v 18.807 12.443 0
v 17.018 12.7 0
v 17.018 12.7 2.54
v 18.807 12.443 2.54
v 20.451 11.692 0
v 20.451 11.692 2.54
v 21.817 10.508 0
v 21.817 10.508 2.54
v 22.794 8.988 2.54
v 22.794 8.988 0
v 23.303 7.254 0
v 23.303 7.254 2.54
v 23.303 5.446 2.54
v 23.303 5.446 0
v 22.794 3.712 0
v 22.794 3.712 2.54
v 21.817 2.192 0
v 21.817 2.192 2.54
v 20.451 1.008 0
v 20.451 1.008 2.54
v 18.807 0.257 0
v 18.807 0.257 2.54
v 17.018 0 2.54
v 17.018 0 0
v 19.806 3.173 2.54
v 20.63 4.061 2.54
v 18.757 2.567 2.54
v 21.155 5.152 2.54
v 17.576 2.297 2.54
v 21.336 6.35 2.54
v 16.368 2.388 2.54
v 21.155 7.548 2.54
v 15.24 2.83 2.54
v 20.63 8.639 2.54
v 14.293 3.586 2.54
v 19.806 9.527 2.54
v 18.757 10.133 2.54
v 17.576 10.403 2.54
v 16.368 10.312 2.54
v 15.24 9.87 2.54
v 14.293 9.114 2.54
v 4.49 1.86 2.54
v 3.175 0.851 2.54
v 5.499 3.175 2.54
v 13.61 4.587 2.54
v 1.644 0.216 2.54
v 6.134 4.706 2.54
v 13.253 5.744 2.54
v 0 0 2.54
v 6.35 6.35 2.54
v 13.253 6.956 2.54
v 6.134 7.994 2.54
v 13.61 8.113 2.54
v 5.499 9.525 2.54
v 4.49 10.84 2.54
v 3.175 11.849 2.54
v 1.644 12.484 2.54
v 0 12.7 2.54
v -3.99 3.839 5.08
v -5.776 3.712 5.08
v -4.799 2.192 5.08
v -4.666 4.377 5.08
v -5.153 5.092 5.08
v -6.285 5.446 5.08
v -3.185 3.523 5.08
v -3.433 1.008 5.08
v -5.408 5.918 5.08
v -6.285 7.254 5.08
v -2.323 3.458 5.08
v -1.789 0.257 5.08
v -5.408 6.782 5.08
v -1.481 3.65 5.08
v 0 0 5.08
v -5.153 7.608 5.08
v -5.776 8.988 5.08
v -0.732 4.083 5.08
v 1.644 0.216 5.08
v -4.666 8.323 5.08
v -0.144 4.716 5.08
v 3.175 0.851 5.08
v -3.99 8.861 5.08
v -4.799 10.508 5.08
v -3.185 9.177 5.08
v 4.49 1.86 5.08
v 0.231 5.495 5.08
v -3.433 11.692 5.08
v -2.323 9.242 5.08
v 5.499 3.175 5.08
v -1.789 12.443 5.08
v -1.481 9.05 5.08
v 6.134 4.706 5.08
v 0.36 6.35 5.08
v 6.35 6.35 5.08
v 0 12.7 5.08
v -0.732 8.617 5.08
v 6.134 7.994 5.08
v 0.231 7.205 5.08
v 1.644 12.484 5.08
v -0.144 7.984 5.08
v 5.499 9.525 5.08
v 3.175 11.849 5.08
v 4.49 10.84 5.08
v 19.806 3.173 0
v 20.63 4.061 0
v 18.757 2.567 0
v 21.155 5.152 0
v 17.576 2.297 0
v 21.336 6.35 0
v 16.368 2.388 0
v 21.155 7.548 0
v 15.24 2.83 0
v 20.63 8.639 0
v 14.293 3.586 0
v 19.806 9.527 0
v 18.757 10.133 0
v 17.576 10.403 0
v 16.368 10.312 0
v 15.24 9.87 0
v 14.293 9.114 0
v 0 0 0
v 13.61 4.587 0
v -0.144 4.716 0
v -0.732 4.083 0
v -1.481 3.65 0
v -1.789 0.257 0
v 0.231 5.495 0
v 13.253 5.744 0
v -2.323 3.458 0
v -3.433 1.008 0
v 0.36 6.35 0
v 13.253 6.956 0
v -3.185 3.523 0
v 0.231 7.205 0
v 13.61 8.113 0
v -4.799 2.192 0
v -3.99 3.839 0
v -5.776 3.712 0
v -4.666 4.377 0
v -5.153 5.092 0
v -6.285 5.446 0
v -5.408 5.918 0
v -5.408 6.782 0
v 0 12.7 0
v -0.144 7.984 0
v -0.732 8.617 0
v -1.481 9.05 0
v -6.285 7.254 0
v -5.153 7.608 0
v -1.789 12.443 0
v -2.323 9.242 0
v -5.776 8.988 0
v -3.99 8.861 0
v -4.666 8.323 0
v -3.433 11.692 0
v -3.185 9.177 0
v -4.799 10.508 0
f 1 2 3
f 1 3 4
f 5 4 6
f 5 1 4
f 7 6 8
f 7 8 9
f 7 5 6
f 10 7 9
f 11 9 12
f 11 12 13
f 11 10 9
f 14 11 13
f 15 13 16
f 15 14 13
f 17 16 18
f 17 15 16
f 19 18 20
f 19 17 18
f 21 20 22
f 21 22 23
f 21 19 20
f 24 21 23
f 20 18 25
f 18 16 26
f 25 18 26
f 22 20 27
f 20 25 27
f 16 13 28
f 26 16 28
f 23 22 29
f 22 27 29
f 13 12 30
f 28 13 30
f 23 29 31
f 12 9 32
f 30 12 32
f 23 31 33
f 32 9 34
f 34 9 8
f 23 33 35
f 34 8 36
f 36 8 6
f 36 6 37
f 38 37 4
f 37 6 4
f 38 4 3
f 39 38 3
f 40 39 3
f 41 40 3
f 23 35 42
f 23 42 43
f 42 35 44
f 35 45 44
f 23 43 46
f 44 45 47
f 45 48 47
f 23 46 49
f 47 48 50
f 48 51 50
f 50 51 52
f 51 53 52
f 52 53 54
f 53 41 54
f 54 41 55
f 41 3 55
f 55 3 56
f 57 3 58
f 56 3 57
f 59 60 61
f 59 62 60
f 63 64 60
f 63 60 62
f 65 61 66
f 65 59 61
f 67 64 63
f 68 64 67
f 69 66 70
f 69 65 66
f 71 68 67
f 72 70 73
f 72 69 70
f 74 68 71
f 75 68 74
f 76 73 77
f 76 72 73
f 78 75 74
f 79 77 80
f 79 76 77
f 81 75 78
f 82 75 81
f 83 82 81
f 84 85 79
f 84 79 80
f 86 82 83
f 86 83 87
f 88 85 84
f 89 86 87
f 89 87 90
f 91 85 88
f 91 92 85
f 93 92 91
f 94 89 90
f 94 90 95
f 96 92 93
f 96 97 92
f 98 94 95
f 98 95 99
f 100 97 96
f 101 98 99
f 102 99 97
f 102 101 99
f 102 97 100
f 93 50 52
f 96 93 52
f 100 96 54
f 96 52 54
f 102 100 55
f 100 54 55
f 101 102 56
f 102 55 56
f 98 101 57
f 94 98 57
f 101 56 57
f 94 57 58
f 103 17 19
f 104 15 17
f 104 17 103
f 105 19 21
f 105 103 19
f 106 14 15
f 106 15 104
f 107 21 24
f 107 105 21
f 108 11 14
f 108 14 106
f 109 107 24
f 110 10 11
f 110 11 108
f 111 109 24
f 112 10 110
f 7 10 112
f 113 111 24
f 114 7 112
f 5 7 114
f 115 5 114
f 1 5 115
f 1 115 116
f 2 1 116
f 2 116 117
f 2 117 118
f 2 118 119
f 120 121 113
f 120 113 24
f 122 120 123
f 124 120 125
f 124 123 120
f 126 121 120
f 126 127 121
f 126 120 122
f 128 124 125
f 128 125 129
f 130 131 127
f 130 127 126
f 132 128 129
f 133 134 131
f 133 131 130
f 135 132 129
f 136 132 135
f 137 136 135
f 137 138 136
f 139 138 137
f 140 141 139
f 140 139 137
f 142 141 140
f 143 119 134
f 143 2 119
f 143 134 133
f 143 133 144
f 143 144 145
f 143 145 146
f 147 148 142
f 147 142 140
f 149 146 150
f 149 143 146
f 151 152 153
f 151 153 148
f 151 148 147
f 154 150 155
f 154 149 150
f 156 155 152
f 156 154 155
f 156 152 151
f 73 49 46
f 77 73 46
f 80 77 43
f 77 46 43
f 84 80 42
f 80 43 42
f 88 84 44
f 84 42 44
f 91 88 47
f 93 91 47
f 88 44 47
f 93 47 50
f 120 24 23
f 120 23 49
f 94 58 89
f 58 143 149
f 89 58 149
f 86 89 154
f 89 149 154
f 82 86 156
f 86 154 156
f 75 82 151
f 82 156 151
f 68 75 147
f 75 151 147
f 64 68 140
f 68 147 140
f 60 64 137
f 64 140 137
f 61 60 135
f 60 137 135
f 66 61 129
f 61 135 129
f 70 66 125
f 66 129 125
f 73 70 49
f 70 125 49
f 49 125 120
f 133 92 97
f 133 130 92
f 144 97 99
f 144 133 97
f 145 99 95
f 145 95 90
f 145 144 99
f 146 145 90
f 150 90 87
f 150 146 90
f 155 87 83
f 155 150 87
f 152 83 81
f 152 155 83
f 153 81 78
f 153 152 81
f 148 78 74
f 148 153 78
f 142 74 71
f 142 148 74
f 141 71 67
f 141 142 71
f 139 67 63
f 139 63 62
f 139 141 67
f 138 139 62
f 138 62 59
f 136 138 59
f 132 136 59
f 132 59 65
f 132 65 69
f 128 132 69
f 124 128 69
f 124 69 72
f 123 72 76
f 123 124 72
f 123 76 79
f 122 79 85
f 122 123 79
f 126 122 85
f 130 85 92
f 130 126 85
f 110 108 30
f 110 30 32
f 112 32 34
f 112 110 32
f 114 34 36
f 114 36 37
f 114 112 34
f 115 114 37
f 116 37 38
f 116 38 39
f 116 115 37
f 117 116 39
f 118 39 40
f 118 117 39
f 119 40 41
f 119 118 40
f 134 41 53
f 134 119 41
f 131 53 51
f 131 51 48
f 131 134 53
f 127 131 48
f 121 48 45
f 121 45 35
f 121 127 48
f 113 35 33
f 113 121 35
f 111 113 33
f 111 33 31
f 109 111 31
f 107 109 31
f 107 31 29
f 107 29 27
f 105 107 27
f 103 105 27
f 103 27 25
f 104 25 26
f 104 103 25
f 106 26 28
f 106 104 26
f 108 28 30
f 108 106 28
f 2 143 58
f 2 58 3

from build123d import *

# Parameters (mm, degrees)
SKETCH1_R           = 2.9
SKETCH1_R_2         = 4.064
BOSS_EXTRUDE1_DEPTH = 2.54
SKETCH2_R           = 2.9
BOSS_EXTRUDE2_DEPTH = 2.54


with BuildPart() as part:
    # Sketch1 → Boss-Extrude1 (new body)
    with BuildSketch(Plane.XY):
        with BuildLine():
            Line((0, 12.7), (17.018, 12.7))
            ThreePointArc((17.018, 12.7), (23.368, 6.35), (17.018, 0))
            Line((17.018, 0), (0, 0))
            ThreePointArc((0, 0), (-6.35, 6.35), (0, 12.7))
        make_face()
        with Locations((-2.54, 6.35)):
            Circle(SKETCH1_R, mode=Mode.SUBTRACT)
        with Locations((17.272, 6.35)):
            Circle(SKETCH1_R_2, mode=Mode.SUBTRACT)
    extrude(amount=BOSS_EXTRUDE1_DEPTH)

    # Sketch2 → Boss-Extrude2 (add)
    with BuildSketch(Plane.XY.offset(2.54)):
        with BuildLine():
            ThreePointArc((0, 0), (4.490128061, 1.859871939), (6.35, 6.35))
            ThreePointArc((6.35, 6.35), (4.490128061, 10.840128061), (0, 12.7))
            ThreePointArc((0, 12.7), (-6.35, 6.35), (0, 0))
        make_face()
        with Locations((-2.54, 6.35)):
            Circle(SKETCH2_R, mode=Mode.SUBTRACT)
    extrude(amount=BOSS_EXTRUDE2_DEPTH)


solid = part.part
